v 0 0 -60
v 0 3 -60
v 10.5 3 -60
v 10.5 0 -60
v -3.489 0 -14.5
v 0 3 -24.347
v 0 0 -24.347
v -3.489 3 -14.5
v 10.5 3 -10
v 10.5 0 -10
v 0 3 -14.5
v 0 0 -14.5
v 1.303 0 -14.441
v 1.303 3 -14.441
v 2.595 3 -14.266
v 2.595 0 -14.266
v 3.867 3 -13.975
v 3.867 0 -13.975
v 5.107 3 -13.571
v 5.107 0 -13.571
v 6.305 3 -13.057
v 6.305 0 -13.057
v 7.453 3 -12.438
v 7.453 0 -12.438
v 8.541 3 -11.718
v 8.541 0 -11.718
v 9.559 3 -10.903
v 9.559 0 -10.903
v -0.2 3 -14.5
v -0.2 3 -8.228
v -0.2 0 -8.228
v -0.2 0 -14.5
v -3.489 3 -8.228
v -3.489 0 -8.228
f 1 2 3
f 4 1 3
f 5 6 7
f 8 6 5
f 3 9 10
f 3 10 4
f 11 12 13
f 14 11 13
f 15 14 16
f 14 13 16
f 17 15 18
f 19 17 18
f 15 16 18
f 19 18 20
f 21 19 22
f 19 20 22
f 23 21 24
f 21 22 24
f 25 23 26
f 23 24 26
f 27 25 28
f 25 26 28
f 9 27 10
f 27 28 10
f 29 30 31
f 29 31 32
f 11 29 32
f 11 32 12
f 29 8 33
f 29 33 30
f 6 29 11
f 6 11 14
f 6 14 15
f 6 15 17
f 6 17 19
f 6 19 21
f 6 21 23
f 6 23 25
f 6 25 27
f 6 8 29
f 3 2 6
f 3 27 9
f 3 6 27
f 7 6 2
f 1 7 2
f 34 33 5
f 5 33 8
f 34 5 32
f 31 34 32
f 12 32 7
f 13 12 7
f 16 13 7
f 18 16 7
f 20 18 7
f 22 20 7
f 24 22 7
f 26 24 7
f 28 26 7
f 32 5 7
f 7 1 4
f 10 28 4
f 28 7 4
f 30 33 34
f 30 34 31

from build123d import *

# Parameters (mm, degrees)
EXTRUDE_1_DEPTH = 3
SKETCH_2_W      = 3.288983057
SKETCH_2_H      = 6.272081599
EXTRUDE_2_DEPTH = 3
SKETCH_3_W      = 10.5
SKETCH_3_H      = 28.238150406
EXTRUDE_3_DEPTH = 3


with BuildPart() as part:
    # 草图1 → 凸台-拉伸1 (new body)
    with BuildSketch(Plane(origin=(0, 0, 0), x_dir=(1, 0, 0), z_dir=(0, 1, 0))):
        with BuildLine():
            ThreePointArc((0, 14.5), (5.711829829, 13.327602935), (10.5, 10))
            Line((10.5, 10), (10.5, 31.761849594))
            Line((10.5, 31.761849594), (0, 31.761849594))
            Line((0, 31.761849594), (0, 14.5))
        make_face()
    extrude(amount=EXTRUDE_1_DEPTH)

    # 草图2 → 凸台-拉伸2 (add)
    with BuildSketch(Plane(origin=(0, 3, 0), x_dir=(1, 0, 0), z_dir=(0, 1, 0))):
        Polygon((-0.2, 14.5), (0, 14.5), (0, 24.347174928), (-3.488983057, 14.5), align=None)
        with Locations((-1.844491529, 11.363959201)):
            Rectangle(SKETCH_2_W, SKETCH_2_H)
    extrude(amount=-EXTRUDE_2_DEPTH)

    # 草图3 → 凸台-拉伸3 (add)
    with BuildSketch(Plane(origin=(0, 3, 0), x_dir=(1, 0, 0), z_dir=(0, 1, 0))):
        with Locations((5.25, 45.880924797)):
            Rectangle(SKETCH_3_W, SKETCH_3_H)
    extrude(amount=-EXTRUDE_3_DEPTH)


solid = part.part
